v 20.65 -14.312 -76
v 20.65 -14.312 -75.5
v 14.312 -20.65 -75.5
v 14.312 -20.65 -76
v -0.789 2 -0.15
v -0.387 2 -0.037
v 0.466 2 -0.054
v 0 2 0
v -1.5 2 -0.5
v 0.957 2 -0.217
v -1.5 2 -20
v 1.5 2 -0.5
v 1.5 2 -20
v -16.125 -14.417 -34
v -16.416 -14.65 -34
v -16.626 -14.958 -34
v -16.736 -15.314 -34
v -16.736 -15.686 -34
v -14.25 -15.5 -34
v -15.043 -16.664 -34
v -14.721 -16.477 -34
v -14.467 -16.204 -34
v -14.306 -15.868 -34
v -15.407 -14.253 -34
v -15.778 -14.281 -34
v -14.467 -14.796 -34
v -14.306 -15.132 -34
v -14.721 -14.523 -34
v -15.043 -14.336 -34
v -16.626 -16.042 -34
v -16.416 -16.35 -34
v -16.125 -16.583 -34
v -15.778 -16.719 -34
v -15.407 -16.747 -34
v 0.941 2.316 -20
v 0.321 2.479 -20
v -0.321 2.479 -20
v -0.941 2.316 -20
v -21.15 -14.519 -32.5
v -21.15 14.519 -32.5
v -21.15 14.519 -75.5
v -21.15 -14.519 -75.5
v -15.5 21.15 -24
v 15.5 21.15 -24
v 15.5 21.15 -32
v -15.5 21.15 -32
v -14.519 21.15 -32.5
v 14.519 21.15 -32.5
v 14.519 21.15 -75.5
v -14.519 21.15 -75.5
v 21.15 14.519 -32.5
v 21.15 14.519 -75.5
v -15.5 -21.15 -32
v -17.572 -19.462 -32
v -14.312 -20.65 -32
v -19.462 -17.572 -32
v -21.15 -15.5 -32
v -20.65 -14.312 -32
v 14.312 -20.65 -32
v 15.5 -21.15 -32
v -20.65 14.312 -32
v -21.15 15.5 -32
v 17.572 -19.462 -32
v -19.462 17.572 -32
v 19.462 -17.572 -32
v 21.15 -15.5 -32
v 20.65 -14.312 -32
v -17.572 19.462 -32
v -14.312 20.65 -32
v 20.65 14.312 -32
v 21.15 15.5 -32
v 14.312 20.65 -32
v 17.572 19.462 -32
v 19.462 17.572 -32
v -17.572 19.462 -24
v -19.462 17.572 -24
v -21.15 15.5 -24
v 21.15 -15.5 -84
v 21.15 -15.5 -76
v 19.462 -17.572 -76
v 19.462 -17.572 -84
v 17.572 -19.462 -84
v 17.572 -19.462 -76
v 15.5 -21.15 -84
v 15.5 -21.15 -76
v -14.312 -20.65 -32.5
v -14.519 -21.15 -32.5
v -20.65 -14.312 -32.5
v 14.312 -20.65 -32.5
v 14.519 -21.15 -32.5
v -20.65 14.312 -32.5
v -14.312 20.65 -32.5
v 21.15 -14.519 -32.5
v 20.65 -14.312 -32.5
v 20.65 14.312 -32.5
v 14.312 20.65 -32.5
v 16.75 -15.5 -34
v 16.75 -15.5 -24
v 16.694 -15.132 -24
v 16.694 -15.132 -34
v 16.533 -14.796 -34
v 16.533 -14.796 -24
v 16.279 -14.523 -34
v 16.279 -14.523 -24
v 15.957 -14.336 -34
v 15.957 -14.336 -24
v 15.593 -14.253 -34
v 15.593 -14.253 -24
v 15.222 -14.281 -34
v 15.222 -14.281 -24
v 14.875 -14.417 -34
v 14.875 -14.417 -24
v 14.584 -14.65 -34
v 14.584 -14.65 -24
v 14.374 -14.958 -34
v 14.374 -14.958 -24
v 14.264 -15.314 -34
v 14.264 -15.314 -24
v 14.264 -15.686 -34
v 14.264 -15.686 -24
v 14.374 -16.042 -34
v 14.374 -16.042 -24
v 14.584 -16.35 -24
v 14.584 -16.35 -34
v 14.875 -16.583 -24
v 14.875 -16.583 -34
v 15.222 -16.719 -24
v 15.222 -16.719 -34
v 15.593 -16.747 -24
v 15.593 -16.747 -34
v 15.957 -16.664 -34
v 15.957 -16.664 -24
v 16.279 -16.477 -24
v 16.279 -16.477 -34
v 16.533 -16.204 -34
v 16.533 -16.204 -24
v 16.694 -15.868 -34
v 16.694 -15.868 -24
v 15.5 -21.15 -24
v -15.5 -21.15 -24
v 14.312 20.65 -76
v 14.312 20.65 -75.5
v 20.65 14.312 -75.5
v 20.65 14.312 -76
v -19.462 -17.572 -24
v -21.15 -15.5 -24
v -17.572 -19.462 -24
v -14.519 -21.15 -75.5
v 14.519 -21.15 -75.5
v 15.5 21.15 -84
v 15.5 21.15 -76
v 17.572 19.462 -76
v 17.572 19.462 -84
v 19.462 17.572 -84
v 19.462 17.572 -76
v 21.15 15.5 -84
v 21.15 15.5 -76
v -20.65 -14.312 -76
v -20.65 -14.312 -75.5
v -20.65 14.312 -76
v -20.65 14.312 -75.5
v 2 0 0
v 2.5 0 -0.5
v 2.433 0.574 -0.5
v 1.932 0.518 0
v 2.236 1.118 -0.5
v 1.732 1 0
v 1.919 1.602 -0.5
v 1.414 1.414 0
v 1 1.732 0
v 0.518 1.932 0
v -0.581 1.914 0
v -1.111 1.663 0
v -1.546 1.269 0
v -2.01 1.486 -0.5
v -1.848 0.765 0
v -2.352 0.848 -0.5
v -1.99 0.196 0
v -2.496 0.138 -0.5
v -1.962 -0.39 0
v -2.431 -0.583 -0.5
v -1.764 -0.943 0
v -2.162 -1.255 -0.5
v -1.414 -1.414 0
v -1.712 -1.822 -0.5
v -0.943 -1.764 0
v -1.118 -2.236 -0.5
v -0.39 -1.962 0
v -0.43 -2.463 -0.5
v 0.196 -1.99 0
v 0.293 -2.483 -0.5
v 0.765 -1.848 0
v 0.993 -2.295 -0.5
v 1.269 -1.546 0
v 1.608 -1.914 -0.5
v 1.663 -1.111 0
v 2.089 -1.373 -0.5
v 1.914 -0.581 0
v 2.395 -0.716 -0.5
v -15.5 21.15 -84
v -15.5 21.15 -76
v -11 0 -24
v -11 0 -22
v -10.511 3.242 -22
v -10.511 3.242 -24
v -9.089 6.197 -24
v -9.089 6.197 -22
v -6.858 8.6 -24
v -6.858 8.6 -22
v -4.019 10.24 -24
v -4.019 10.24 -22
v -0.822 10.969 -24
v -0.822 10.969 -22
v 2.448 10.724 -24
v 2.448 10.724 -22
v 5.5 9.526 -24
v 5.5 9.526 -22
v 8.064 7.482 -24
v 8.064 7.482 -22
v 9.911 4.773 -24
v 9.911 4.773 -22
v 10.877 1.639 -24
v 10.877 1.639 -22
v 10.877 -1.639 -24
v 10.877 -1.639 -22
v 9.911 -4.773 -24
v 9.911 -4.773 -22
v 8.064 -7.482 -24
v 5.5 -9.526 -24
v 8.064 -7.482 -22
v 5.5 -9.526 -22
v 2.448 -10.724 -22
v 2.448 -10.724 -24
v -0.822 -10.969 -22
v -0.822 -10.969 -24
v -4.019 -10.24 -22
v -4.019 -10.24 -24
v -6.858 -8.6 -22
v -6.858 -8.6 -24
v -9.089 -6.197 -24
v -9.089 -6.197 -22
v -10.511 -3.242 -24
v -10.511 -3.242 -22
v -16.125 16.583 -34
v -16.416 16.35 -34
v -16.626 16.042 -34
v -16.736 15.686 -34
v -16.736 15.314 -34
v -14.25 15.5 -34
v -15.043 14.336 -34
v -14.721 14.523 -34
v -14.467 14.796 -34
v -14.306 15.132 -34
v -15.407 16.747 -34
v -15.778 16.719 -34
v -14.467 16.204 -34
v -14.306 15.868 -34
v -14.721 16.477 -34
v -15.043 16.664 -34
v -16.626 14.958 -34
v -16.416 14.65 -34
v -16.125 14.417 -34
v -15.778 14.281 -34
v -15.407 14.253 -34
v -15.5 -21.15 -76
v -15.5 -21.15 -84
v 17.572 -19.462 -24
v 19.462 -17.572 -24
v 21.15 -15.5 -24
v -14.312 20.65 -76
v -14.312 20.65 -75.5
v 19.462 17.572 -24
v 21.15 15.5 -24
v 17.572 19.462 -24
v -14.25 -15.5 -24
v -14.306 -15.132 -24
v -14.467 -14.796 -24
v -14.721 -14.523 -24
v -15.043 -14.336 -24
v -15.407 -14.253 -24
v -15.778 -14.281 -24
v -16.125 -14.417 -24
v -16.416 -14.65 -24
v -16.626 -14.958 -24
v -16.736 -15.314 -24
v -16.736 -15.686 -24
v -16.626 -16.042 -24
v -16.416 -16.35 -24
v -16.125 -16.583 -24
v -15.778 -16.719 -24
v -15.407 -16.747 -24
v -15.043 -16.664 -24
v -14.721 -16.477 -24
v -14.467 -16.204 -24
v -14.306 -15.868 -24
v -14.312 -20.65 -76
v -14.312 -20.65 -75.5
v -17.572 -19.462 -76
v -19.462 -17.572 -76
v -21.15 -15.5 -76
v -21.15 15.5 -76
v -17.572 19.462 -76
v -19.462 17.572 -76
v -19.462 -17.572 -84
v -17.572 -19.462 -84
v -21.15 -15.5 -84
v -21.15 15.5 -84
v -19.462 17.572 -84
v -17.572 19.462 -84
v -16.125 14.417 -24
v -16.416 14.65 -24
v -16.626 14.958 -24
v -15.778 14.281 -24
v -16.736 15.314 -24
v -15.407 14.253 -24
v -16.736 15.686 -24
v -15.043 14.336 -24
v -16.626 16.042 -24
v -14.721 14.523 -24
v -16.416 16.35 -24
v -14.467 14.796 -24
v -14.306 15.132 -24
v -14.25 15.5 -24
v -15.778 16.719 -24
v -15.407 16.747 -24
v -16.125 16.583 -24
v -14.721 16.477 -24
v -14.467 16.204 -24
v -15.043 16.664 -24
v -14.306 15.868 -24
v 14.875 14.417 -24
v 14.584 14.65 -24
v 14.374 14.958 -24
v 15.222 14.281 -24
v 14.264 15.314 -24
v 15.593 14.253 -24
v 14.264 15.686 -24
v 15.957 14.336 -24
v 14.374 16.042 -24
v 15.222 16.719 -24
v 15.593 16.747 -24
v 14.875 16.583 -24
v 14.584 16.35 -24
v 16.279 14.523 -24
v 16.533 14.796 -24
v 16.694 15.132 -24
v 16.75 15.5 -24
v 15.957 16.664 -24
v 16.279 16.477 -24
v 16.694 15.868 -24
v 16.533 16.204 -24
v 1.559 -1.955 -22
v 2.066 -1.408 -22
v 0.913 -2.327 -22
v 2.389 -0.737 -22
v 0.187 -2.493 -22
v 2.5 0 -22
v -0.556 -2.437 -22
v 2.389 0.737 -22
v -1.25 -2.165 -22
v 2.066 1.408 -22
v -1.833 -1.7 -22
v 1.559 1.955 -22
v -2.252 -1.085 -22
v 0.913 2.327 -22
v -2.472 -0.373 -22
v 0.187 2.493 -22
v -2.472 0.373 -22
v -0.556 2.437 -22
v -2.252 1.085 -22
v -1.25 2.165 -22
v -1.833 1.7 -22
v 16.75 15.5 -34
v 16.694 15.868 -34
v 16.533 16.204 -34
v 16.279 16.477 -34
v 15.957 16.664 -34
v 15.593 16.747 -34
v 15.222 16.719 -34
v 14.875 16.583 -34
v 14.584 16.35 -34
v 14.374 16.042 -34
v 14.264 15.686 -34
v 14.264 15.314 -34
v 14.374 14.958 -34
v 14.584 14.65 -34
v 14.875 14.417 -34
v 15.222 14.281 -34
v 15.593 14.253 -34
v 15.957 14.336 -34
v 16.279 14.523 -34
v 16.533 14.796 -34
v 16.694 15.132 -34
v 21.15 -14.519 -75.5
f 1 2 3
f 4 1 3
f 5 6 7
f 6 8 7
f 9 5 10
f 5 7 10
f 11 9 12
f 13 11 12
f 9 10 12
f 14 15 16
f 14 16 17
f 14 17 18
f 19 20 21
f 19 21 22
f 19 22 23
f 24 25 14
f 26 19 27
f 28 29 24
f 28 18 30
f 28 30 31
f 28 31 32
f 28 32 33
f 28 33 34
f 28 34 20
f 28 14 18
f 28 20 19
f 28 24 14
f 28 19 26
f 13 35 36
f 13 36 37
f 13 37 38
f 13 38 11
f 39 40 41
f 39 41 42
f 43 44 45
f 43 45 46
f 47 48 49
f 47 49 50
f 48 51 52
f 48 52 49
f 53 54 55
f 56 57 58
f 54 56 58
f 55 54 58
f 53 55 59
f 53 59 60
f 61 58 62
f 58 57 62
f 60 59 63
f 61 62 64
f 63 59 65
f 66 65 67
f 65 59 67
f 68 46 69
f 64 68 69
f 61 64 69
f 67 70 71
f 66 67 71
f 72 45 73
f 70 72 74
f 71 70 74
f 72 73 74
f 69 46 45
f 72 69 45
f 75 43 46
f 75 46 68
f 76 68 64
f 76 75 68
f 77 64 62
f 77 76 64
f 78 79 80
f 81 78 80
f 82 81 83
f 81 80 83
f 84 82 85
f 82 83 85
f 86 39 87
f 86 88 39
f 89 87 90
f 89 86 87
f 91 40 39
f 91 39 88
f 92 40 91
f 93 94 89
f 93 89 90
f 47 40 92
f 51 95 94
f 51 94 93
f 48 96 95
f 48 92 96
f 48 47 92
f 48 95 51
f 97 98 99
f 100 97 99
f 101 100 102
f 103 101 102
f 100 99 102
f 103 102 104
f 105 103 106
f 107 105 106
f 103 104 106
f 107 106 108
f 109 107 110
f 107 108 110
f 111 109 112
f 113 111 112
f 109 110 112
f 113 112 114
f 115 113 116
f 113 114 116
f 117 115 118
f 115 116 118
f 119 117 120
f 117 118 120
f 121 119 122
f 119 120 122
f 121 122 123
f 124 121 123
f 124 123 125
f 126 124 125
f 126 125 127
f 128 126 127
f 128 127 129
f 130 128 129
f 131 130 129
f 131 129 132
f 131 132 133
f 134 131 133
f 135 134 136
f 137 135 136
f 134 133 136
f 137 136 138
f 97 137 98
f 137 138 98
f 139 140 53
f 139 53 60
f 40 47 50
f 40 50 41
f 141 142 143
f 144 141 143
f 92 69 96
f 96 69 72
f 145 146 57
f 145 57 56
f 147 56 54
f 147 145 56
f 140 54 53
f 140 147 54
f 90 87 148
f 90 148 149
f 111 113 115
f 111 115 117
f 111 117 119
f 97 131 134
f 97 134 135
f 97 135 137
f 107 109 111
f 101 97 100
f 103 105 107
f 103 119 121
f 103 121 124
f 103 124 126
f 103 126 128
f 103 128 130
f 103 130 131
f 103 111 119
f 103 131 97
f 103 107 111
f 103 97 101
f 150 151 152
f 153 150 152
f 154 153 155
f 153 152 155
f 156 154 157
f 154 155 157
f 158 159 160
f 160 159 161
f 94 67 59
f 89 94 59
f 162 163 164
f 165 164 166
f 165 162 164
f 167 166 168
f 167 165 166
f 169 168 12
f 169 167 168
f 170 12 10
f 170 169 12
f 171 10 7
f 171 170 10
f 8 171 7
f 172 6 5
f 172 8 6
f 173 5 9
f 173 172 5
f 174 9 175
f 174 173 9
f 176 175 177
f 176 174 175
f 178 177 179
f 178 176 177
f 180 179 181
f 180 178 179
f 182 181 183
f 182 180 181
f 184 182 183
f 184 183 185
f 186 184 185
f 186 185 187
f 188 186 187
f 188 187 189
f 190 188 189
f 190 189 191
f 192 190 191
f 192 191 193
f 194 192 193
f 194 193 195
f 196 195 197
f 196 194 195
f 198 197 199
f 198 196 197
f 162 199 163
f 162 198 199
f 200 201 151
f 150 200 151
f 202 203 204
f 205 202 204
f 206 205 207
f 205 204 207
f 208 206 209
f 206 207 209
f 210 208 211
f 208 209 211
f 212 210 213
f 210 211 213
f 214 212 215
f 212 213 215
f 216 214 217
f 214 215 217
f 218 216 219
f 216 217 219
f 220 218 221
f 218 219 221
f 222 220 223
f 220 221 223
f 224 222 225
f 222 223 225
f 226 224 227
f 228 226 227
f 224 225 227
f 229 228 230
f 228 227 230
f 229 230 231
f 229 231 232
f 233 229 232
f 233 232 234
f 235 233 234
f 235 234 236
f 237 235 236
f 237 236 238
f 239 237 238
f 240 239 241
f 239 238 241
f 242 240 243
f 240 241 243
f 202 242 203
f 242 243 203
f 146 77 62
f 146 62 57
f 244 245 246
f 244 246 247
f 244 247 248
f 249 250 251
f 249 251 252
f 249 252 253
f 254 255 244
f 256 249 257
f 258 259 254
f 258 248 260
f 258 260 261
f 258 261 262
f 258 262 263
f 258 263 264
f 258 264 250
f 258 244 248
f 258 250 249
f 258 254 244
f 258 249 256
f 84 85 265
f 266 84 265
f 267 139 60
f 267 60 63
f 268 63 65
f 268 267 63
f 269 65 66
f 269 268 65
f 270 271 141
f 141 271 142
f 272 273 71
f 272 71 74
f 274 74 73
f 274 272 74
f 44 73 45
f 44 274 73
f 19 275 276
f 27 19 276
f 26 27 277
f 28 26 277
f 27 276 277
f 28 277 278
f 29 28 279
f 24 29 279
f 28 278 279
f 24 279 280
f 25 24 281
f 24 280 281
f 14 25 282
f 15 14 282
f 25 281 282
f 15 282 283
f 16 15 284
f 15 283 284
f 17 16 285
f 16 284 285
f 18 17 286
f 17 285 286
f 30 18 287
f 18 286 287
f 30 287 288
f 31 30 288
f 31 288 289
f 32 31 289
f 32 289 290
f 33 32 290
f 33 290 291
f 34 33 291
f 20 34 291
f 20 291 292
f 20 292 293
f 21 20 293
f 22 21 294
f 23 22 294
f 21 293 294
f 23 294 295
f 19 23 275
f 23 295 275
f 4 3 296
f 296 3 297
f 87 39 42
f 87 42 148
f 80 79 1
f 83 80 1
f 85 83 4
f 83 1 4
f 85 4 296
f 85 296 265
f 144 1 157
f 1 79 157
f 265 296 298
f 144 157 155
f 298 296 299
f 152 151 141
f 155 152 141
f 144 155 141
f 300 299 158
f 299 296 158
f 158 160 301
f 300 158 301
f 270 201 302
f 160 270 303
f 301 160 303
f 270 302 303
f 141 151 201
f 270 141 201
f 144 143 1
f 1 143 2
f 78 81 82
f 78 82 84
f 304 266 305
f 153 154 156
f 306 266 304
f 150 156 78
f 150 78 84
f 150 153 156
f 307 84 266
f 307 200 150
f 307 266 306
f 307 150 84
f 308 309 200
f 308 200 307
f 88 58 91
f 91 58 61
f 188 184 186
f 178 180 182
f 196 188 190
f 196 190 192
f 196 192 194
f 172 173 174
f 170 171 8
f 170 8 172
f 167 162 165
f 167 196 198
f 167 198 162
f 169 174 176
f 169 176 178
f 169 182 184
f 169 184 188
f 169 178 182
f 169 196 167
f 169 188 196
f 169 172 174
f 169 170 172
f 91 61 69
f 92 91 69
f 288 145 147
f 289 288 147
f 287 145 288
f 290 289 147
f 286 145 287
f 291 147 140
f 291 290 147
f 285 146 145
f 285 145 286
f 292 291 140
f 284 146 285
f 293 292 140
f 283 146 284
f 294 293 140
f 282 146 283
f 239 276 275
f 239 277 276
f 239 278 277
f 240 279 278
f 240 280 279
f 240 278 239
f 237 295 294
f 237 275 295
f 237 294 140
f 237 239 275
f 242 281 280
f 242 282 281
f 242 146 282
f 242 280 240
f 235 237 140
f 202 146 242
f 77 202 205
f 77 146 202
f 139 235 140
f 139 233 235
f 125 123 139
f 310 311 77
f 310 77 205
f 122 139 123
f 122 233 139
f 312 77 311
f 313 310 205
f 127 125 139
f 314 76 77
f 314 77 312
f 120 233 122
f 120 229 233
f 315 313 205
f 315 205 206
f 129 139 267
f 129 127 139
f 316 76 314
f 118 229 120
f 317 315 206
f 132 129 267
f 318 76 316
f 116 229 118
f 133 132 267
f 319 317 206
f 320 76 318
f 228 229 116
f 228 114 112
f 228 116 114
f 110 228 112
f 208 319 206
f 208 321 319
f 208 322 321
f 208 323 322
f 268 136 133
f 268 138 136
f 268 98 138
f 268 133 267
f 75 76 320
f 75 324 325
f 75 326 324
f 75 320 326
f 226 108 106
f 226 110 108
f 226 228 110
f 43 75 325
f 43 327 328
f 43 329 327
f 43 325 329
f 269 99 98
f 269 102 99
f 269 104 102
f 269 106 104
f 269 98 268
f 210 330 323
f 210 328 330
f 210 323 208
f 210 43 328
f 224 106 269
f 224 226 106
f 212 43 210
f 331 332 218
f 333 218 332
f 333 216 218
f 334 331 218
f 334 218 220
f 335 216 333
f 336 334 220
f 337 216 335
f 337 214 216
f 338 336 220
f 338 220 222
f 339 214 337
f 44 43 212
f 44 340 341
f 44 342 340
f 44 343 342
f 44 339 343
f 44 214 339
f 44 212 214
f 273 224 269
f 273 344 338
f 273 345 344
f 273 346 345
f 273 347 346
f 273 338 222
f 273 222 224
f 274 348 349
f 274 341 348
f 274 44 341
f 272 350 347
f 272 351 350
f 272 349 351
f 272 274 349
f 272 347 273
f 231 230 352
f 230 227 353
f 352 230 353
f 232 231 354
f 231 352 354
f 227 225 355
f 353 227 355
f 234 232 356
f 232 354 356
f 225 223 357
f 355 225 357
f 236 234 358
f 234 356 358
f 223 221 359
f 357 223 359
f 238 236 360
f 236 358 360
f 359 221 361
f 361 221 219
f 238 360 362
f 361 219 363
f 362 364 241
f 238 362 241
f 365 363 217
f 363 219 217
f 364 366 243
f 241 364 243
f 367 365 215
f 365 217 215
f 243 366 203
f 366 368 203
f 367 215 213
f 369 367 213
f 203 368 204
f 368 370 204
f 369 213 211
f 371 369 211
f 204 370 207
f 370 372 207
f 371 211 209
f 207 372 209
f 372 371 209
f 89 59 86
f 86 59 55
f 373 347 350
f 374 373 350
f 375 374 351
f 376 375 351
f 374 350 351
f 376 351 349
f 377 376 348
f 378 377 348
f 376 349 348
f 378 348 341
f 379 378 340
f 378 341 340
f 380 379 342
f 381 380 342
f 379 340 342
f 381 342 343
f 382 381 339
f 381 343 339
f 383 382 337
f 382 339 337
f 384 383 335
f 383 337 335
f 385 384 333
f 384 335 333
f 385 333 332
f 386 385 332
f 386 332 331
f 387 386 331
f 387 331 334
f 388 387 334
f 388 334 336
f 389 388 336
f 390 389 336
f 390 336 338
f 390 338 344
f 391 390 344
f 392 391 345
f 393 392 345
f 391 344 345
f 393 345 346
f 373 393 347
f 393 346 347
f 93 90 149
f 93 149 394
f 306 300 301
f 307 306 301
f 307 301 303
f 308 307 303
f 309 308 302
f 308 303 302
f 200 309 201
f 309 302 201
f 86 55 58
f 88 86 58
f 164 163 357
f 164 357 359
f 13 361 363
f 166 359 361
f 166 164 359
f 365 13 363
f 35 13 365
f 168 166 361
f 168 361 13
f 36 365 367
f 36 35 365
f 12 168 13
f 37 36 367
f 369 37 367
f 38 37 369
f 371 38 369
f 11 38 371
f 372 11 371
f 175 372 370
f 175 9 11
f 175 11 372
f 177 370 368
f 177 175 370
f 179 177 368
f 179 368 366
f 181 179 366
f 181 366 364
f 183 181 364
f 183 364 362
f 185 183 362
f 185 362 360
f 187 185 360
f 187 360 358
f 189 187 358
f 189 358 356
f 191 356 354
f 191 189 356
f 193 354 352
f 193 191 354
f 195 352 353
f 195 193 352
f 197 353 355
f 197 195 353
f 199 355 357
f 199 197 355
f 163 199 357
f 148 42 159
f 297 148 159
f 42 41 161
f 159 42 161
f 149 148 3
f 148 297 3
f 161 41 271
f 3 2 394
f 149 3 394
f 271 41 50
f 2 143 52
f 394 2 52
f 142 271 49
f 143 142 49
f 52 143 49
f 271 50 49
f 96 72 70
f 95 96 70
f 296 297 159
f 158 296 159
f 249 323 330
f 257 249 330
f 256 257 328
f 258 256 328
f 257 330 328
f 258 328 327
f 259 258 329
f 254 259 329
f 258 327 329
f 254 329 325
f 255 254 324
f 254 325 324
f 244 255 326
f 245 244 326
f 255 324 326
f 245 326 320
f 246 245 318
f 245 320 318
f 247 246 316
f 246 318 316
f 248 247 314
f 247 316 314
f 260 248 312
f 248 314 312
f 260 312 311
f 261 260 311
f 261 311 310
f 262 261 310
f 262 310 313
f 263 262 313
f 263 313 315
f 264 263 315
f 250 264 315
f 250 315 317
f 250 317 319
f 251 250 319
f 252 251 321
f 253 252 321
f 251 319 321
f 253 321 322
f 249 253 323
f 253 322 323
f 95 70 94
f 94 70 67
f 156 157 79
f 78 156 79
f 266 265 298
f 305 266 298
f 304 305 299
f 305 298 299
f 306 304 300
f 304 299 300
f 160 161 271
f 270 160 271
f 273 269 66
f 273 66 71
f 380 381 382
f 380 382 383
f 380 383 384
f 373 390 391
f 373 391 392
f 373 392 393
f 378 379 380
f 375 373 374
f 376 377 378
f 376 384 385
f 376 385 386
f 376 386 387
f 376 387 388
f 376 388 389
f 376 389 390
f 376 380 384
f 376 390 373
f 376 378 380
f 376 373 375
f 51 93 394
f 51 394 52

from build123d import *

# Parameters (mm, degrees)
SKETCH1_R           = 2.5
BOSS_EXTRUDE1_DEPTH = 22
SKETCH2_R           = 11
BOSS_EXTRUDE2_DEPTH = 2
BOSS_EXTRUDE3_DEPTH = 8
BOSS_EXTRUDE6_DEPTH = 0.5
BOSS_EXTRUDE4_DEPTH = 43
BOSS_EXTRUDE7_DEPTH = 0.5
BOSS_EXTRUDE5_DEPTH = 8
CHAMFER1_SIZE       = 0.5
SKETCH8_W           = 6.467116259
SKETCH8_H           = 1.343520631
CUT_EXTRUDE1_DEPTH  = 20
SKETCH9_R           = 1.25
CUT_EXTRUDE2_DEPTH  = 10


with BuildPart() as part:
    # Sketch1 → Boss-Extrude1 (new body)
    with BuildSketch(Plane.XY):
        Circle(SKETCH1_R)
    extrude(amount=-BOSS_EXTRUDE1_DEPTH)

    # Sketch2 → Boss-Extrude2 (add)
    with BuildSketch(Plane(origin=(0, 0, -22), x_dir=(-1, 0, 0), z_dir=(0, 0, -1))):
        Circle(SKETCH2_R)
    extrude(amount=BOSS_EXTRUDE2_DEPTH)

    # Sketch3 → Boss-Extrude3 (add)
    with BuildSketch(Plane(origin=(0, 0, -24), x_dir=(-1, 0, 0), z_dir=(0, 0, -1))):
        with BuildLine():
            Line((15.5, -21.15), (-15.5, -21.15))
            ThreePointArc((-15.5, -21.15), (-18.541473782, -18.541473782), (-21.15, -15.5))
            Line((-21.15, -15.5), (-21.15, 15.5))
            ThreePointArc((-21.15, 15.5), (-18.541473782, 18.541473782), (-15.5, 21.15))
            Line((-15.5, 21.15), (15.5, 21.15))
            ThreePointArc((15.5, 21.15), (18.541473782, 18.541473782), (21.15, 15.5))
            Line((21.15, 15.5), (21.15, -15.5))
            ThreePointArc((21.15, -15.5), (18.541473782, -18.541473782), (15.5, -21.15))
        make_face()
    extrude(amount=BOSS_EXTRUDE3_DEPTH)

    # Sketch6 → Boss-Extrude6 (add)
    with BuildSketch(Plane(origin=(0, 0, -32), x_dir=(-1, 0, 0), z_dir=(0, 0, -1))):
        Polygon((-20.65, -14.31162722), (-14.31162722, -20.65), (14.31162722, -20.65), (20.65, -14.31162722), (20.65, 14.31162722), (14.31162722, 20.65), (-14.31162722, 20.65), (-20.65, 14.31162722), align=None)
    extrude(amount=BOSS_EXTRUDE6_DEPTH)

    # Sketch4 → Boss-Extrude4 (add)
    with BuildSketch(Plane(origin=(0, 0, -32.5), x_dir=(-1, 0, 0), z_dir=(0, 0, -1))):
        Polygon((-21.15, 14.518734001), (-14.518734001, 21.15), (14.518734001, 21.15), (21.15, 14.518734001), (21.15, -14.518734001), (14.518734001, -21.15), (-14.518734001, -21.15), (-21.15, -14.518734001), align=None)
    extrude(amount=BOSS_EXTRUDE4_DEPTH)

    # Sketch7 → Boss-Extrude7 (add)
    with BuildSketch(Plane(origin=(0, 0, -75.5), x_dir=(-1, 0, 0), z_dir=(0, 0, -1))):
        Polygon((-20.65, -14.31162722), (-14.31162722, -20.65), (14.31162722, -20.65), (20.65, -14.31162722), (20.65, 14.31162722), (14.31162722, 20.65), (-14.31162722, 20.65), (-20.65, 14.31162722), align=None)
    extrude(amount=BOSS_EXTRUDE7_DEPTH)

    # Sketch5 → Boss-Extrude5 (add)
    with BuildSketch(Plane(origin=(0, 0, -76), x_dir=(-1, 0, 0), z_dir=(0, 0, -1))):
        with BuildLine():
            Line((-15.5, -21.15), (15.5, -21.15))
            ThreePointArc((15.5, -21.15), (18.541473782, -18.541473782), (21.15, -15.5))
            Line((21.15, -15.5), (21.15, 15.5))
            ThreePointArc((21.15, 15.5), (18.541473782, 18.541473782), (15.5, 21.15))
            Line((15.5, 21.15), (-15.5, 21.15))
            ThreePointArc((-15.5, 21.15), (-18.541473782, 18.541473782), (-21.15, 15.5))
            Line((-21.15, 15.5), (-21.15, -15.5))
            ThreePointArc((-21.15, -15.5), (-18.541473782, -18.541473782), (-15.5, -21.15))
        make_face()
    extrude(amount=BOSS_EXTRUDE5_DEPTH)

    # Chamfer1
    chamfer1_edges = [part.edges().sort_by_distance(p)[0] for p in [
        (-2.5, 0, 0),
    ]]
    chamfer(chamfer1_edges, length=CHAMFER1_SIZE)

    # Sketch8 → Cut-Extrude1 (cut)
    with BuildSketch(Plane.XY):
        with Locations((0.298403281, 2.671760316)):
            Rectangle(SKETCH8_W, SKETCH8_H)
    extrude(amount=-CUT_EXTRUDE1_DEPTH, mode=Mode.SUBTRACT)

    # Sketch9 → Cut-Extrude2 (cut)
    with BuildSketch(Plane.XY.offset(-24)):
        with Locations((-15.5, 15.5)):
            Circle(SKETCH9_R)
        with Locations((15.5, 15.5)):
            Circle(SKETCH9_R)
        with Locations((15.5, -15.5)):
            Circle(SKETCH9_R)
        with Locations((-15.5, -15.5)):
            Circle(SKETCH9_R)
    extrude(amount=-CUT_EXTRUDE2_DEPTH, mode=Mode.SUBTRACT)


solid = part.part
